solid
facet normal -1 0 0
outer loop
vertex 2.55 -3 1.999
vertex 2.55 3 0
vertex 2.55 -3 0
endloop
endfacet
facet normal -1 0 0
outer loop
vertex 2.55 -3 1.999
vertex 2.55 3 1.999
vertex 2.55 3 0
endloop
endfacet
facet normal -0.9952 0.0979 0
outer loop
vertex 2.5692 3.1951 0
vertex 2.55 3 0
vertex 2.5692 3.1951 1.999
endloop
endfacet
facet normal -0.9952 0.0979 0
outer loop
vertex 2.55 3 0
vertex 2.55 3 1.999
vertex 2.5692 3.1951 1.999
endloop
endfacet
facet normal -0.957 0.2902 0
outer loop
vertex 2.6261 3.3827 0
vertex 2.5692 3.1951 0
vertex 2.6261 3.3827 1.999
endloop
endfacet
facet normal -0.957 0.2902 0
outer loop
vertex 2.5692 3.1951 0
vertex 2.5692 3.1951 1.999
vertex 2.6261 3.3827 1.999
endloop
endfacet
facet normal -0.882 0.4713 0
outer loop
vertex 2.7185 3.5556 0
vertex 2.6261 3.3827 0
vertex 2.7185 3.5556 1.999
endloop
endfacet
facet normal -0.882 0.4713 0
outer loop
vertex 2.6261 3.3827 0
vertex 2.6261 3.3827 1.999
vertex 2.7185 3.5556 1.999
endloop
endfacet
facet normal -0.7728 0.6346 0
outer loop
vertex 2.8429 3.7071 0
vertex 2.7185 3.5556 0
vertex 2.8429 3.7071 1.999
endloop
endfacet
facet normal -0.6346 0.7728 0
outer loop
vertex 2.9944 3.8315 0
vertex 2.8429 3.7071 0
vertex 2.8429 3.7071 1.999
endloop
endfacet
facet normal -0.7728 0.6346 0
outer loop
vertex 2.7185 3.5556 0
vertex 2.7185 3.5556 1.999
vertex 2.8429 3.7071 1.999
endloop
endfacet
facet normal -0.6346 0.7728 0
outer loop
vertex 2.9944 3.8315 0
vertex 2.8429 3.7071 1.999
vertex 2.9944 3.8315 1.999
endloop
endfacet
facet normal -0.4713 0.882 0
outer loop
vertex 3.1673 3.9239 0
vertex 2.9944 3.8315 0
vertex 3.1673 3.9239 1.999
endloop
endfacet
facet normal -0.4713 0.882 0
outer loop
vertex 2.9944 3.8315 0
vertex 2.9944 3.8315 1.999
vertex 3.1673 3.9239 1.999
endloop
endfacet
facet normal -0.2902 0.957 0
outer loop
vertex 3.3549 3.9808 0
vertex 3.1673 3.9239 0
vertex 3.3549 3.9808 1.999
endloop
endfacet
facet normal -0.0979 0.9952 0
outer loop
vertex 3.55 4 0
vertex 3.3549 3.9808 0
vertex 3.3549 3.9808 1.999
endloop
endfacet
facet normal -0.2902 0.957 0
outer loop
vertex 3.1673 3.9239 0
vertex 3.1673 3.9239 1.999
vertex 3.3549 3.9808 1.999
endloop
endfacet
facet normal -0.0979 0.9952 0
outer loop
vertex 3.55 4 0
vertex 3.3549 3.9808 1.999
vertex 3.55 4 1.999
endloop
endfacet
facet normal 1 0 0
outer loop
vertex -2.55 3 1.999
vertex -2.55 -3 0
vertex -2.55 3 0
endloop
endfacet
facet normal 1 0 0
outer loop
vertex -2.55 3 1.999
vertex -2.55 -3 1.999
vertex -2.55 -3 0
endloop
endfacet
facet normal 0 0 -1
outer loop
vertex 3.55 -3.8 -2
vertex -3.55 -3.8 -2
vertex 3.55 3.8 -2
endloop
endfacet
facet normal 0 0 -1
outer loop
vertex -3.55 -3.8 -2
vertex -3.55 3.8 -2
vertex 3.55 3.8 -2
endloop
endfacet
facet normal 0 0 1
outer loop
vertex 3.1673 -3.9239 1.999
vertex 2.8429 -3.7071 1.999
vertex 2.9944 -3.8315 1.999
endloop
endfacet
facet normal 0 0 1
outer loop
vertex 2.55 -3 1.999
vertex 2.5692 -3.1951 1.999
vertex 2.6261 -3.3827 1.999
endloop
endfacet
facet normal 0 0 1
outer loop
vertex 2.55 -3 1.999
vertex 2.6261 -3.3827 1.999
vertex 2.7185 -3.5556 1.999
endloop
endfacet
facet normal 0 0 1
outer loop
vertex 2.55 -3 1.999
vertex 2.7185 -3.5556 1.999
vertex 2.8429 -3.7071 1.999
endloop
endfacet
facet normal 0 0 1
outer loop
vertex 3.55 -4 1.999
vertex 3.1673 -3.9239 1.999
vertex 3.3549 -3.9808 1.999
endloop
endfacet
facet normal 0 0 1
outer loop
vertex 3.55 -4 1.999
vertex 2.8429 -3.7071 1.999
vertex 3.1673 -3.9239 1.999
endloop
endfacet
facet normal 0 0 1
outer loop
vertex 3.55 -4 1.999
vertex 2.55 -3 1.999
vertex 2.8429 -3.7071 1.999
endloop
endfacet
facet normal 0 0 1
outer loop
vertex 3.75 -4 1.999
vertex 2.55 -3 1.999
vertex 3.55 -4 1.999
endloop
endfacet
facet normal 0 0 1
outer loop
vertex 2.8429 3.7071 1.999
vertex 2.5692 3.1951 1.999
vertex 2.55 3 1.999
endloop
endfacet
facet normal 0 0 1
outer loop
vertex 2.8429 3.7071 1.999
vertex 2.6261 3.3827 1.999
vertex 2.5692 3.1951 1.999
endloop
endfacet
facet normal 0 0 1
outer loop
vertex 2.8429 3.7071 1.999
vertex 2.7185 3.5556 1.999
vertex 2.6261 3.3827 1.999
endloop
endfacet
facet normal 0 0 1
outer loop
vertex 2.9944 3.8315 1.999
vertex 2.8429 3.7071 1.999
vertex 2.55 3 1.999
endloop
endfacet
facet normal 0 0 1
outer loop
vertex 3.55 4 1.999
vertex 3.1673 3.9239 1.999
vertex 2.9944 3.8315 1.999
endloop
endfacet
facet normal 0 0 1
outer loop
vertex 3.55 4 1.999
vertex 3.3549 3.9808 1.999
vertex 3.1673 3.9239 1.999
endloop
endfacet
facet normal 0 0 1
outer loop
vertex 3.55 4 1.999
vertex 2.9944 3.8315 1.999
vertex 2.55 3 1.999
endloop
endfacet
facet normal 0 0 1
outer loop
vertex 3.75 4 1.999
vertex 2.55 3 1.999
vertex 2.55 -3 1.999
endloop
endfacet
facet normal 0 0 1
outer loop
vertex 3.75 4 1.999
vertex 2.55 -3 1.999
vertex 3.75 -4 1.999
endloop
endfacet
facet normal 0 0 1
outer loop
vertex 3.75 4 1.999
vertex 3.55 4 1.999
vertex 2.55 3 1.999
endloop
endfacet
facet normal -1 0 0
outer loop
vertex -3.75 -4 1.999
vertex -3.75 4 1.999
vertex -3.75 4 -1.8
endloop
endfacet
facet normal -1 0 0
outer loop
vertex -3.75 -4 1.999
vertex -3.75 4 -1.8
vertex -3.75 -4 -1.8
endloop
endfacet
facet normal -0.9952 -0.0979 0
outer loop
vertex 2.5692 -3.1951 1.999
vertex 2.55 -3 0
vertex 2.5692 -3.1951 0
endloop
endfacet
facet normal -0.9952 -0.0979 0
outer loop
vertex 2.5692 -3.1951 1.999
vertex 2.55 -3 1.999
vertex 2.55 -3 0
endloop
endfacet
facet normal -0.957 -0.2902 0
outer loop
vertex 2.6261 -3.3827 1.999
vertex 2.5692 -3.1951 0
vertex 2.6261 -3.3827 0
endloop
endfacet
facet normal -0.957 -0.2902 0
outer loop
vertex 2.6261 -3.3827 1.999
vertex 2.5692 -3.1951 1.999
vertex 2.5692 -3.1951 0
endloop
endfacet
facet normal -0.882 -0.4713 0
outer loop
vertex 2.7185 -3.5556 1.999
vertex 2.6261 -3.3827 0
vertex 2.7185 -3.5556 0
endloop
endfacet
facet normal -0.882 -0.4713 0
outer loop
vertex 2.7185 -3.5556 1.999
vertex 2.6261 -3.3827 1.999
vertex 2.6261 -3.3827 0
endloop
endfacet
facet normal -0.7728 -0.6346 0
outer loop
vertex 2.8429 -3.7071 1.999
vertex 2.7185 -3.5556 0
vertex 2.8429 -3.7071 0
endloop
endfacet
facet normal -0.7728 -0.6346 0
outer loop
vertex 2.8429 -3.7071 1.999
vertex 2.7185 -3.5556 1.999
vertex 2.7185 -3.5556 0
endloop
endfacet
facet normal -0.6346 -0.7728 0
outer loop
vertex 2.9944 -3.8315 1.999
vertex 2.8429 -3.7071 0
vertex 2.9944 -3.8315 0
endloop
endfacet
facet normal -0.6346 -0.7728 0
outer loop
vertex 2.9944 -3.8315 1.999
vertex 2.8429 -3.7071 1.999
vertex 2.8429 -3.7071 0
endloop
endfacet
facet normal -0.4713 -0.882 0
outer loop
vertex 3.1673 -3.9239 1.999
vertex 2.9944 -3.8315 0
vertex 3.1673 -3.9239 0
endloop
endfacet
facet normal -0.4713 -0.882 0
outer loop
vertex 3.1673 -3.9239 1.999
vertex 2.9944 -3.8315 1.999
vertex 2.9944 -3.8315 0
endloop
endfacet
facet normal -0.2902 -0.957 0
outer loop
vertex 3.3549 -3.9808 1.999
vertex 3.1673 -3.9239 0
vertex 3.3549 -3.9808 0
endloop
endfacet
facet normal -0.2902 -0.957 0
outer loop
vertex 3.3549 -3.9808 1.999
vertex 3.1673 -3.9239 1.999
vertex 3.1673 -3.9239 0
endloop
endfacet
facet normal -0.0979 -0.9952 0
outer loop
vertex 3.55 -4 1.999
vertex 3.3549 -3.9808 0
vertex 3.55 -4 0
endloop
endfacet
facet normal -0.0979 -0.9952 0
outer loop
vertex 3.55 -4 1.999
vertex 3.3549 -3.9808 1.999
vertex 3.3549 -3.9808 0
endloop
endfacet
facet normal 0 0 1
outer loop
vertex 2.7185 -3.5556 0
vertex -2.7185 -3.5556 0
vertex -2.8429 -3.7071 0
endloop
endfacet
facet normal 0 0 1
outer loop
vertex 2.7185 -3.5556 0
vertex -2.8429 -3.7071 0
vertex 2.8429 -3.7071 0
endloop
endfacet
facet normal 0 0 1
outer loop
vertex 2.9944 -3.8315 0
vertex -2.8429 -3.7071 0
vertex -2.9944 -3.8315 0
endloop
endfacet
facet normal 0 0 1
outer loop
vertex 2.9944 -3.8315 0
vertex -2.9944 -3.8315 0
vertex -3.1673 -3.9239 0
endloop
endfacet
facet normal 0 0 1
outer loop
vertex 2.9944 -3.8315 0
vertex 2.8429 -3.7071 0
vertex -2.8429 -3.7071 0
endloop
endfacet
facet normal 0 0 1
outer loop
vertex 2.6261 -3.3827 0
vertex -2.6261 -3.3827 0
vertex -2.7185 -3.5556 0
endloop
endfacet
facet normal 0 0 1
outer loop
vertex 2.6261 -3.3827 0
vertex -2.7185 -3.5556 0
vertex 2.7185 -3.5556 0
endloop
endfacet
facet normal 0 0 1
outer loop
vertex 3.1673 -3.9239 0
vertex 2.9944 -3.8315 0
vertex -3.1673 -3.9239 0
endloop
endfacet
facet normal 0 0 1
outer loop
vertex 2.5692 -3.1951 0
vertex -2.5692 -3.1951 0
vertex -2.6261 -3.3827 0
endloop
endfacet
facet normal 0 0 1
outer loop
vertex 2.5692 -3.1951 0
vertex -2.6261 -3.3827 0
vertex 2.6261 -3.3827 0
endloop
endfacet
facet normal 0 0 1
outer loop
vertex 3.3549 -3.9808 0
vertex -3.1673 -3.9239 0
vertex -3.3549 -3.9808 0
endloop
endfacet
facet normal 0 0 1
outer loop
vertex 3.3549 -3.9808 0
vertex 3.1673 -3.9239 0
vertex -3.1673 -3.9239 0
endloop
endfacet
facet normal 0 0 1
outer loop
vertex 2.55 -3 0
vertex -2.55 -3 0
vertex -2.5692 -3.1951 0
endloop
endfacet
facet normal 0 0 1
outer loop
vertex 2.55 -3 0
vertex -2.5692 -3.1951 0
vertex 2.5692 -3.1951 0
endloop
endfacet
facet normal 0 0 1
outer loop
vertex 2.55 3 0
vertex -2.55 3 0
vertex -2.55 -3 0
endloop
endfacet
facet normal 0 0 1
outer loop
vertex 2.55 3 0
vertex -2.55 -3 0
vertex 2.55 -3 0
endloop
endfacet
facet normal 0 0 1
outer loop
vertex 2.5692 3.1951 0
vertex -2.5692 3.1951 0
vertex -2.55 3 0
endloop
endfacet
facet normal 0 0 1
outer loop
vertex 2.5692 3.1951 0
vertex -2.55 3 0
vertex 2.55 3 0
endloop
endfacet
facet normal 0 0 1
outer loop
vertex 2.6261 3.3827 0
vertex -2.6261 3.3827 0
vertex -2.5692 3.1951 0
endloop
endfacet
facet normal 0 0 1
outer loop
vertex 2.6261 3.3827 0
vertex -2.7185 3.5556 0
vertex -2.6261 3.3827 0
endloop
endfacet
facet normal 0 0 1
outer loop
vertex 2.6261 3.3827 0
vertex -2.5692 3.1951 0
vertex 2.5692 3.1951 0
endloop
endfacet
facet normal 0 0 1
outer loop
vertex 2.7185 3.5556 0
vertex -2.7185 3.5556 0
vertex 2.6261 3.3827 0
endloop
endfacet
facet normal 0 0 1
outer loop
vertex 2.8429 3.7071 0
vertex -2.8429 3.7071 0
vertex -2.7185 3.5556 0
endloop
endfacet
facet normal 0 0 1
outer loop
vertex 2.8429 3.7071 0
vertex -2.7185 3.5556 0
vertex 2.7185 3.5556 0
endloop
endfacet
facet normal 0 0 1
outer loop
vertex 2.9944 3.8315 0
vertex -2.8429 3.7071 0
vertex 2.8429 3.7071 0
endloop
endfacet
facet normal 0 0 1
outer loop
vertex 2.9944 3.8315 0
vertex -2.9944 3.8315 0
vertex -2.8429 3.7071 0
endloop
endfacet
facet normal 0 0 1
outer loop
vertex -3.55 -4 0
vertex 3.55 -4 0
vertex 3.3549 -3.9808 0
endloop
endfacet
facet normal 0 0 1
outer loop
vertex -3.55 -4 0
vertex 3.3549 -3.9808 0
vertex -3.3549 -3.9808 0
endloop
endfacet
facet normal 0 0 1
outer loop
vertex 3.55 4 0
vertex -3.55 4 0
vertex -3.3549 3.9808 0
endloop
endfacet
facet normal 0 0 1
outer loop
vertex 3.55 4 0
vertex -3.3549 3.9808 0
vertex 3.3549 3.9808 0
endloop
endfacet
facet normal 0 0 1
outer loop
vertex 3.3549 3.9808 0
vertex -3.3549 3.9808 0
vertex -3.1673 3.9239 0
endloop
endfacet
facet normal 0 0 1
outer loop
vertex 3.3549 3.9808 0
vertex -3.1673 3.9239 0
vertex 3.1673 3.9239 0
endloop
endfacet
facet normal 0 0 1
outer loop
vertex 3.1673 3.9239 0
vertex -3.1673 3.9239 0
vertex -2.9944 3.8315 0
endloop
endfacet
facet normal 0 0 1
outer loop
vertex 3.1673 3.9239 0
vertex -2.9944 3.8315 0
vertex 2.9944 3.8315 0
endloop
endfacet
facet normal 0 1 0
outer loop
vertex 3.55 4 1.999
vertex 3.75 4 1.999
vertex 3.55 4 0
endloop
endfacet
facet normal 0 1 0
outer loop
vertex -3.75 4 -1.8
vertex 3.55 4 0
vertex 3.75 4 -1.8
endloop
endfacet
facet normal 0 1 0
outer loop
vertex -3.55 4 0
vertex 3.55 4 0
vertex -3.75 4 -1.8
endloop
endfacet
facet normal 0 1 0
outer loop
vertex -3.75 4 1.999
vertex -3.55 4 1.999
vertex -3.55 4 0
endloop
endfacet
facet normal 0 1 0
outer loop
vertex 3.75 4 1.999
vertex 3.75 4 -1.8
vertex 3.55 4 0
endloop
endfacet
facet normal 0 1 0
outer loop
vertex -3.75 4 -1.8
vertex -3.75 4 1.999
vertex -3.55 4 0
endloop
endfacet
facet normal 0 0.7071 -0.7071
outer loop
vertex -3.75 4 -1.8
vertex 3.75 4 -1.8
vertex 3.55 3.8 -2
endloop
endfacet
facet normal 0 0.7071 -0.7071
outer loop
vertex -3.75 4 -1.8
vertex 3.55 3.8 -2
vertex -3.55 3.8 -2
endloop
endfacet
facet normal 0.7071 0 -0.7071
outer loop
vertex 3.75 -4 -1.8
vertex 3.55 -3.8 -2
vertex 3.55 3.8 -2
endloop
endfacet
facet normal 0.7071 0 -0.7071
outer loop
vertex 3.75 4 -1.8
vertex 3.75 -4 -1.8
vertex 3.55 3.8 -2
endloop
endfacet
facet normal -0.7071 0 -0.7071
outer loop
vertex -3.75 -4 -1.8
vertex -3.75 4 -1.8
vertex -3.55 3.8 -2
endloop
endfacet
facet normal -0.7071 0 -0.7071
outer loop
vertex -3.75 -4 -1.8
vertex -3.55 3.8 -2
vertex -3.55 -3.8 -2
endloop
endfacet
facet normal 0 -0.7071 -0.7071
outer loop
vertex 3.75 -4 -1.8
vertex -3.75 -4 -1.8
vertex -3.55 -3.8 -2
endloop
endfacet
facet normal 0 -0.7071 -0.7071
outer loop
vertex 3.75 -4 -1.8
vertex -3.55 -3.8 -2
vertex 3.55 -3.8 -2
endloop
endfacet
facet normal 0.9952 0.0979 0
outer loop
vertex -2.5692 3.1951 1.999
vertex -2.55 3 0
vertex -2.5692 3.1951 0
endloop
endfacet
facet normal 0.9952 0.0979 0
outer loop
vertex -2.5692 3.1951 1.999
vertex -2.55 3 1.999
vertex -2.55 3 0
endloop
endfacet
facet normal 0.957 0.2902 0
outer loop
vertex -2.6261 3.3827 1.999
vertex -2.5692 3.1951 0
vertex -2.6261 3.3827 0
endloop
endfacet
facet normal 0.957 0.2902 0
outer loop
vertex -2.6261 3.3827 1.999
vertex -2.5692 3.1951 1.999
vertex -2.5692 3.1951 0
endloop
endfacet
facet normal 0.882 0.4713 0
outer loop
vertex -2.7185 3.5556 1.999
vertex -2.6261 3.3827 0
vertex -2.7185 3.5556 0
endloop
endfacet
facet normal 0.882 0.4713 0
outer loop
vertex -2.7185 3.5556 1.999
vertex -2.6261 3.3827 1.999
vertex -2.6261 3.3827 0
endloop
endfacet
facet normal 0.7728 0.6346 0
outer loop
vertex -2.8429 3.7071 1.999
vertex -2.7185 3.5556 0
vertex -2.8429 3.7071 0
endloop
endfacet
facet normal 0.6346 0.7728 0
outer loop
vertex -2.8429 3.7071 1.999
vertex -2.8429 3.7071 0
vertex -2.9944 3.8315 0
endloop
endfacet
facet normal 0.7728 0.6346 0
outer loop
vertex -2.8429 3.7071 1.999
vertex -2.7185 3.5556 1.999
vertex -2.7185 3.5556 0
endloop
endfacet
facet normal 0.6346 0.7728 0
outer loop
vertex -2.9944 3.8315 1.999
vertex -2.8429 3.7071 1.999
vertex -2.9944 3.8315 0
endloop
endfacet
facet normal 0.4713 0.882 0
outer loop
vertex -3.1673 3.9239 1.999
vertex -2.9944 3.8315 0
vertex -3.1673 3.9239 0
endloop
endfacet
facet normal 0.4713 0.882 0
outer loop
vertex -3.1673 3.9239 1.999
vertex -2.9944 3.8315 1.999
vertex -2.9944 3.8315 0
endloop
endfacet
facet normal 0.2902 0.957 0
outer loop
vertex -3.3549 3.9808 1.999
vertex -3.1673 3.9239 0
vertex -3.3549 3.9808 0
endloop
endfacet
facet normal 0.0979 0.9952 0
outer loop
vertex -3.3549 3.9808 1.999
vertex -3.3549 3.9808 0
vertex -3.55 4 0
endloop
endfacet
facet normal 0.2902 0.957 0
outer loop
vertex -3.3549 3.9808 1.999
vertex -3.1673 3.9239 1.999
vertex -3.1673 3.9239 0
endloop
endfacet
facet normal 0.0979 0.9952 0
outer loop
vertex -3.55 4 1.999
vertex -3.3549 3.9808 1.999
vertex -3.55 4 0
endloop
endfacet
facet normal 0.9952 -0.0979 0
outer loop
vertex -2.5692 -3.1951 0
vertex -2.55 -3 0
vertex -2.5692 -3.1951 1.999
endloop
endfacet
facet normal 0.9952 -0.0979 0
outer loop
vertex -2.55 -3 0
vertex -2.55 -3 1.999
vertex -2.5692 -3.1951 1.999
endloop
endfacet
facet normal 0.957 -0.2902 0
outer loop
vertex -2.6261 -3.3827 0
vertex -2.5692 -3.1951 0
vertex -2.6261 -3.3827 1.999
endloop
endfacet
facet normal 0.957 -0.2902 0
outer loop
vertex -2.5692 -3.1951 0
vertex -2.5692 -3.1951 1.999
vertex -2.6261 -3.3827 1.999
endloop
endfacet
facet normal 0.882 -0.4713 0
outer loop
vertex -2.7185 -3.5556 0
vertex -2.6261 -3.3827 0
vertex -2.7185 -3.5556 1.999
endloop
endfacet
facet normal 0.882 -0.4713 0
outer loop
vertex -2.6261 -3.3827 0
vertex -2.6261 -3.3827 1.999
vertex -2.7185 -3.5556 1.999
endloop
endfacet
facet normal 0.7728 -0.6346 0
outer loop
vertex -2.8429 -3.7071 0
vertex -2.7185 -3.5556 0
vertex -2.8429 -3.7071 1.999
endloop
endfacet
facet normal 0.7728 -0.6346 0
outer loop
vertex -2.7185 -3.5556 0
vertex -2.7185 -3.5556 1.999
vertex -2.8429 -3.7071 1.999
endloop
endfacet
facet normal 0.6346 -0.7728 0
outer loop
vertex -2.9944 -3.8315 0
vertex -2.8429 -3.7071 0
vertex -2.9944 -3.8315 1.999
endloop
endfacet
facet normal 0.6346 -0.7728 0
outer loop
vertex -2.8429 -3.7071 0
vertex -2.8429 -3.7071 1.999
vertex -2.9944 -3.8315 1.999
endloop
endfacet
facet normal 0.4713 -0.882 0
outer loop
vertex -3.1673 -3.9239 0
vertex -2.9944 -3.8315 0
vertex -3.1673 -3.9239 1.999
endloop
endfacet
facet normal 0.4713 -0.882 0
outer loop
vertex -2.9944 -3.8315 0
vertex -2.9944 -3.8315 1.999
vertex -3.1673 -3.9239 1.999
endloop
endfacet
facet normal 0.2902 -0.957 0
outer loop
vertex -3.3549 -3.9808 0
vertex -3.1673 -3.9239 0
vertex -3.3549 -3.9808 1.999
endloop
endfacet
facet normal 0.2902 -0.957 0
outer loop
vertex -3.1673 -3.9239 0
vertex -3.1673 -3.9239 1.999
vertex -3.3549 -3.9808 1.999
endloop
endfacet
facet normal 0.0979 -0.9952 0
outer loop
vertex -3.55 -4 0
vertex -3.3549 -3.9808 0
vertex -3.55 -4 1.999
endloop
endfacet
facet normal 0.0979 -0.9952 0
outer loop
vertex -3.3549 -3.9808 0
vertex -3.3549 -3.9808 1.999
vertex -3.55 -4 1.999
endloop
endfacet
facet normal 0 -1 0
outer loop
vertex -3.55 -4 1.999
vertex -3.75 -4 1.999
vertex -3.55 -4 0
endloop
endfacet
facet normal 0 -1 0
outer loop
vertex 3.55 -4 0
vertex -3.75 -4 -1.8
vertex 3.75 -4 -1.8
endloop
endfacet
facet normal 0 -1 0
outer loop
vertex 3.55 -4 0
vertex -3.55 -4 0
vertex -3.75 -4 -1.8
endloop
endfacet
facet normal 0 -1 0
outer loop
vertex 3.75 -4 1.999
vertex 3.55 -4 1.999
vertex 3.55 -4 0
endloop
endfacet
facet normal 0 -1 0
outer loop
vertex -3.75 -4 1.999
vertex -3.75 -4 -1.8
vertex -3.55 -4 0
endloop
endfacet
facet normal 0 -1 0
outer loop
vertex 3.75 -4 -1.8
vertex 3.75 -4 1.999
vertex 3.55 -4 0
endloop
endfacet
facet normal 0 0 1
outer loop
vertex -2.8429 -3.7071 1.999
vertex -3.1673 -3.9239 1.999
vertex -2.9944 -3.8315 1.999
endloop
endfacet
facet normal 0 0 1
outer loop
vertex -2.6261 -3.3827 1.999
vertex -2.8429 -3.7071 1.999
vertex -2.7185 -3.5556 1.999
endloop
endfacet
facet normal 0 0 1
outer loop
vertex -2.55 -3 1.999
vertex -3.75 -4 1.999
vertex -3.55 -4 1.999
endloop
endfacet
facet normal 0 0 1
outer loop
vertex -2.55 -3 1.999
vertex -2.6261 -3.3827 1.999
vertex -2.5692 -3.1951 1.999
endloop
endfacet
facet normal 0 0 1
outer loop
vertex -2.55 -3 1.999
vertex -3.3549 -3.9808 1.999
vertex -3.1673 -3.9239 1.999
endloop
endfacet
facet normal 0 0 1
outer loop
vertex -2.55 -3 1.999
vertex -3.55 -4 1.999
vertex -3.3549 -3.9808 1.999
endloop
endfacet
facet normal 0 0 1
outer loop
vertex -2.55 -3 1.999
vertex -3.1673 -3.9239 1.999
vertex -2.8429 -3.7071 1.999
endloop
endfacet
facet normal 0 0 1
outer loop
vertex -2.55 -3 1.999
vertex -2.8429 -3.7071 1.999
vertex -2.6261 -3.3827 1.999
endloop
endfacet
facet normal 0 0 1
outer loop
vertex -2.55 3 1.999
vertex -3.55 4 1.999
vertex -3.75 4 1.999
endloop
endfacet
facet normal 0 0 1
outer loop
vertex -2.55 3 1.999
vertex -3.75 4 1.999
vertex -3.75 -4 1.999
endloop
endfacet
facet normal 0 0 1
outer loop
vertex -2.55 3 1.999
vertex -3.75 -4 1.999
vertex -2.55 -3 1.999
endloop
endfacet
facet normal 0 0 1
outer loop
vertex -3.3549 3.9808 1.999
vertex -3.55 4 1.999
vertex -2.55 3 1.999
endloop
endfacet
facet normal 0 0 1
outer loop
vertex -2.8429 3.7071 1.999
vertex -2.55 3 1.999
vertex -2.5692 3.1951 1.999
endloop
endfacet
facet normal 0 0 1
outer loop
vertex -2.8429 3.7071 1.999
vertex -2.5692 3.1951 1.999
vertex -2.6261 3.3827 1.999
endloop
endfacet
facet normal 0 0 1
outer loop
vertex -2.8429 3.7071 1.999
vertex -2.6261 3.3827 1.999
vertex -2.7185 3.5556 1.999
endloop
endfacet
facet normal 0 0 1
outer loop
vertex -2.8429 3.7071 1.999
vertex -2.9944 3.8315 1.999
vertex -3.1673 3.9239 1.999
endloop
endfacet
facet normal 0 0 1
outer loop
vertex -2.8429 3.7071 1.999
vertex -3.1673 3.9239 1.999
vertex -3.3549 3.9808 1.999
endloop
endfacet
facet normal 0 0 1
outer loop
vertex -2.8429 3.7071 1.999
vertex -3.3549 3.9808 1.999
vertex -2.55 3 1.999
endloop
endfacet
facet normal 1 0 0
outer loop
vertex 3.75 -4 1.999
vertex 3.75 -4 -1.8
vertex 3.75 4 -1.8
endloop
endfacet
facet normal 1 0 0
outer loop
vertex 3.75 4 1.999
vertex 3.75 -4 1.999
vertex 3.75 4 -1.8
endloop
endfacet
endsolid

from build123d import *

# Parameters (mm, degrees)
F1_W    = 5.1
F1_H    = 8
F1_W_2  = 1.2
F4_R    = 1
F5_SIZE = 0.2


with BuildPart() as f2:
    # F2: sweep along a path in F0
    with BuildLine(Plane.XZ) as f2_path:
        Line((0, 0), (0, -2))
    # F1 (on Top) → F2 (sweep)
    with BuildSketch(Plane.XY):
        Rectangle(F1_W, F1_H)
        with Locations((3.15, 0)):
            Rectangle(F1_W_2, F1_H)
        with Locations((-3.15, 0)):
            Rectangle(F1_W_2, F1_H)
    sweep(path=f2_path.line)

    # F3: sweep along a path in F0
    with BuildLine(Plane.XZ) as f3_path:
        Line((0, 0), (0, 1.9990060536))
    # F1 (on Top) → F3 (sweep)
    with BuildSketch(Plane.XY):
        with Locations((-3.15, 0)):
            Rectangle(F1_W_2, F1_H)
        with Locations((3.15, 0)):
            Rectangle(F1_W_2, F1_H)
    sweep(path=f3_path.line)

    # F4
    f4_edges = [f2.edges().sort_by_distance(p)[0] for p in [
        (-2.55, 4, 0.999503),
        (2.55, 4, 0.999503),
        (2.55, -4, 0.999503),
        (-2.55, -4, 0.999503),
    ]]
    fillet(f4_edges, radius=F4_R)

    # F5
    f5_edges = [f2.edges().sort_by_distance(p)[0] for p in [
        (0, -4, -2),
        (3.75, 0, -2),
        (0, 4, -2),
        (-3.75, 0, -2),
    ]]
    chamfer(f5_edges, length=F5_SIZE)


solid = f2.part
